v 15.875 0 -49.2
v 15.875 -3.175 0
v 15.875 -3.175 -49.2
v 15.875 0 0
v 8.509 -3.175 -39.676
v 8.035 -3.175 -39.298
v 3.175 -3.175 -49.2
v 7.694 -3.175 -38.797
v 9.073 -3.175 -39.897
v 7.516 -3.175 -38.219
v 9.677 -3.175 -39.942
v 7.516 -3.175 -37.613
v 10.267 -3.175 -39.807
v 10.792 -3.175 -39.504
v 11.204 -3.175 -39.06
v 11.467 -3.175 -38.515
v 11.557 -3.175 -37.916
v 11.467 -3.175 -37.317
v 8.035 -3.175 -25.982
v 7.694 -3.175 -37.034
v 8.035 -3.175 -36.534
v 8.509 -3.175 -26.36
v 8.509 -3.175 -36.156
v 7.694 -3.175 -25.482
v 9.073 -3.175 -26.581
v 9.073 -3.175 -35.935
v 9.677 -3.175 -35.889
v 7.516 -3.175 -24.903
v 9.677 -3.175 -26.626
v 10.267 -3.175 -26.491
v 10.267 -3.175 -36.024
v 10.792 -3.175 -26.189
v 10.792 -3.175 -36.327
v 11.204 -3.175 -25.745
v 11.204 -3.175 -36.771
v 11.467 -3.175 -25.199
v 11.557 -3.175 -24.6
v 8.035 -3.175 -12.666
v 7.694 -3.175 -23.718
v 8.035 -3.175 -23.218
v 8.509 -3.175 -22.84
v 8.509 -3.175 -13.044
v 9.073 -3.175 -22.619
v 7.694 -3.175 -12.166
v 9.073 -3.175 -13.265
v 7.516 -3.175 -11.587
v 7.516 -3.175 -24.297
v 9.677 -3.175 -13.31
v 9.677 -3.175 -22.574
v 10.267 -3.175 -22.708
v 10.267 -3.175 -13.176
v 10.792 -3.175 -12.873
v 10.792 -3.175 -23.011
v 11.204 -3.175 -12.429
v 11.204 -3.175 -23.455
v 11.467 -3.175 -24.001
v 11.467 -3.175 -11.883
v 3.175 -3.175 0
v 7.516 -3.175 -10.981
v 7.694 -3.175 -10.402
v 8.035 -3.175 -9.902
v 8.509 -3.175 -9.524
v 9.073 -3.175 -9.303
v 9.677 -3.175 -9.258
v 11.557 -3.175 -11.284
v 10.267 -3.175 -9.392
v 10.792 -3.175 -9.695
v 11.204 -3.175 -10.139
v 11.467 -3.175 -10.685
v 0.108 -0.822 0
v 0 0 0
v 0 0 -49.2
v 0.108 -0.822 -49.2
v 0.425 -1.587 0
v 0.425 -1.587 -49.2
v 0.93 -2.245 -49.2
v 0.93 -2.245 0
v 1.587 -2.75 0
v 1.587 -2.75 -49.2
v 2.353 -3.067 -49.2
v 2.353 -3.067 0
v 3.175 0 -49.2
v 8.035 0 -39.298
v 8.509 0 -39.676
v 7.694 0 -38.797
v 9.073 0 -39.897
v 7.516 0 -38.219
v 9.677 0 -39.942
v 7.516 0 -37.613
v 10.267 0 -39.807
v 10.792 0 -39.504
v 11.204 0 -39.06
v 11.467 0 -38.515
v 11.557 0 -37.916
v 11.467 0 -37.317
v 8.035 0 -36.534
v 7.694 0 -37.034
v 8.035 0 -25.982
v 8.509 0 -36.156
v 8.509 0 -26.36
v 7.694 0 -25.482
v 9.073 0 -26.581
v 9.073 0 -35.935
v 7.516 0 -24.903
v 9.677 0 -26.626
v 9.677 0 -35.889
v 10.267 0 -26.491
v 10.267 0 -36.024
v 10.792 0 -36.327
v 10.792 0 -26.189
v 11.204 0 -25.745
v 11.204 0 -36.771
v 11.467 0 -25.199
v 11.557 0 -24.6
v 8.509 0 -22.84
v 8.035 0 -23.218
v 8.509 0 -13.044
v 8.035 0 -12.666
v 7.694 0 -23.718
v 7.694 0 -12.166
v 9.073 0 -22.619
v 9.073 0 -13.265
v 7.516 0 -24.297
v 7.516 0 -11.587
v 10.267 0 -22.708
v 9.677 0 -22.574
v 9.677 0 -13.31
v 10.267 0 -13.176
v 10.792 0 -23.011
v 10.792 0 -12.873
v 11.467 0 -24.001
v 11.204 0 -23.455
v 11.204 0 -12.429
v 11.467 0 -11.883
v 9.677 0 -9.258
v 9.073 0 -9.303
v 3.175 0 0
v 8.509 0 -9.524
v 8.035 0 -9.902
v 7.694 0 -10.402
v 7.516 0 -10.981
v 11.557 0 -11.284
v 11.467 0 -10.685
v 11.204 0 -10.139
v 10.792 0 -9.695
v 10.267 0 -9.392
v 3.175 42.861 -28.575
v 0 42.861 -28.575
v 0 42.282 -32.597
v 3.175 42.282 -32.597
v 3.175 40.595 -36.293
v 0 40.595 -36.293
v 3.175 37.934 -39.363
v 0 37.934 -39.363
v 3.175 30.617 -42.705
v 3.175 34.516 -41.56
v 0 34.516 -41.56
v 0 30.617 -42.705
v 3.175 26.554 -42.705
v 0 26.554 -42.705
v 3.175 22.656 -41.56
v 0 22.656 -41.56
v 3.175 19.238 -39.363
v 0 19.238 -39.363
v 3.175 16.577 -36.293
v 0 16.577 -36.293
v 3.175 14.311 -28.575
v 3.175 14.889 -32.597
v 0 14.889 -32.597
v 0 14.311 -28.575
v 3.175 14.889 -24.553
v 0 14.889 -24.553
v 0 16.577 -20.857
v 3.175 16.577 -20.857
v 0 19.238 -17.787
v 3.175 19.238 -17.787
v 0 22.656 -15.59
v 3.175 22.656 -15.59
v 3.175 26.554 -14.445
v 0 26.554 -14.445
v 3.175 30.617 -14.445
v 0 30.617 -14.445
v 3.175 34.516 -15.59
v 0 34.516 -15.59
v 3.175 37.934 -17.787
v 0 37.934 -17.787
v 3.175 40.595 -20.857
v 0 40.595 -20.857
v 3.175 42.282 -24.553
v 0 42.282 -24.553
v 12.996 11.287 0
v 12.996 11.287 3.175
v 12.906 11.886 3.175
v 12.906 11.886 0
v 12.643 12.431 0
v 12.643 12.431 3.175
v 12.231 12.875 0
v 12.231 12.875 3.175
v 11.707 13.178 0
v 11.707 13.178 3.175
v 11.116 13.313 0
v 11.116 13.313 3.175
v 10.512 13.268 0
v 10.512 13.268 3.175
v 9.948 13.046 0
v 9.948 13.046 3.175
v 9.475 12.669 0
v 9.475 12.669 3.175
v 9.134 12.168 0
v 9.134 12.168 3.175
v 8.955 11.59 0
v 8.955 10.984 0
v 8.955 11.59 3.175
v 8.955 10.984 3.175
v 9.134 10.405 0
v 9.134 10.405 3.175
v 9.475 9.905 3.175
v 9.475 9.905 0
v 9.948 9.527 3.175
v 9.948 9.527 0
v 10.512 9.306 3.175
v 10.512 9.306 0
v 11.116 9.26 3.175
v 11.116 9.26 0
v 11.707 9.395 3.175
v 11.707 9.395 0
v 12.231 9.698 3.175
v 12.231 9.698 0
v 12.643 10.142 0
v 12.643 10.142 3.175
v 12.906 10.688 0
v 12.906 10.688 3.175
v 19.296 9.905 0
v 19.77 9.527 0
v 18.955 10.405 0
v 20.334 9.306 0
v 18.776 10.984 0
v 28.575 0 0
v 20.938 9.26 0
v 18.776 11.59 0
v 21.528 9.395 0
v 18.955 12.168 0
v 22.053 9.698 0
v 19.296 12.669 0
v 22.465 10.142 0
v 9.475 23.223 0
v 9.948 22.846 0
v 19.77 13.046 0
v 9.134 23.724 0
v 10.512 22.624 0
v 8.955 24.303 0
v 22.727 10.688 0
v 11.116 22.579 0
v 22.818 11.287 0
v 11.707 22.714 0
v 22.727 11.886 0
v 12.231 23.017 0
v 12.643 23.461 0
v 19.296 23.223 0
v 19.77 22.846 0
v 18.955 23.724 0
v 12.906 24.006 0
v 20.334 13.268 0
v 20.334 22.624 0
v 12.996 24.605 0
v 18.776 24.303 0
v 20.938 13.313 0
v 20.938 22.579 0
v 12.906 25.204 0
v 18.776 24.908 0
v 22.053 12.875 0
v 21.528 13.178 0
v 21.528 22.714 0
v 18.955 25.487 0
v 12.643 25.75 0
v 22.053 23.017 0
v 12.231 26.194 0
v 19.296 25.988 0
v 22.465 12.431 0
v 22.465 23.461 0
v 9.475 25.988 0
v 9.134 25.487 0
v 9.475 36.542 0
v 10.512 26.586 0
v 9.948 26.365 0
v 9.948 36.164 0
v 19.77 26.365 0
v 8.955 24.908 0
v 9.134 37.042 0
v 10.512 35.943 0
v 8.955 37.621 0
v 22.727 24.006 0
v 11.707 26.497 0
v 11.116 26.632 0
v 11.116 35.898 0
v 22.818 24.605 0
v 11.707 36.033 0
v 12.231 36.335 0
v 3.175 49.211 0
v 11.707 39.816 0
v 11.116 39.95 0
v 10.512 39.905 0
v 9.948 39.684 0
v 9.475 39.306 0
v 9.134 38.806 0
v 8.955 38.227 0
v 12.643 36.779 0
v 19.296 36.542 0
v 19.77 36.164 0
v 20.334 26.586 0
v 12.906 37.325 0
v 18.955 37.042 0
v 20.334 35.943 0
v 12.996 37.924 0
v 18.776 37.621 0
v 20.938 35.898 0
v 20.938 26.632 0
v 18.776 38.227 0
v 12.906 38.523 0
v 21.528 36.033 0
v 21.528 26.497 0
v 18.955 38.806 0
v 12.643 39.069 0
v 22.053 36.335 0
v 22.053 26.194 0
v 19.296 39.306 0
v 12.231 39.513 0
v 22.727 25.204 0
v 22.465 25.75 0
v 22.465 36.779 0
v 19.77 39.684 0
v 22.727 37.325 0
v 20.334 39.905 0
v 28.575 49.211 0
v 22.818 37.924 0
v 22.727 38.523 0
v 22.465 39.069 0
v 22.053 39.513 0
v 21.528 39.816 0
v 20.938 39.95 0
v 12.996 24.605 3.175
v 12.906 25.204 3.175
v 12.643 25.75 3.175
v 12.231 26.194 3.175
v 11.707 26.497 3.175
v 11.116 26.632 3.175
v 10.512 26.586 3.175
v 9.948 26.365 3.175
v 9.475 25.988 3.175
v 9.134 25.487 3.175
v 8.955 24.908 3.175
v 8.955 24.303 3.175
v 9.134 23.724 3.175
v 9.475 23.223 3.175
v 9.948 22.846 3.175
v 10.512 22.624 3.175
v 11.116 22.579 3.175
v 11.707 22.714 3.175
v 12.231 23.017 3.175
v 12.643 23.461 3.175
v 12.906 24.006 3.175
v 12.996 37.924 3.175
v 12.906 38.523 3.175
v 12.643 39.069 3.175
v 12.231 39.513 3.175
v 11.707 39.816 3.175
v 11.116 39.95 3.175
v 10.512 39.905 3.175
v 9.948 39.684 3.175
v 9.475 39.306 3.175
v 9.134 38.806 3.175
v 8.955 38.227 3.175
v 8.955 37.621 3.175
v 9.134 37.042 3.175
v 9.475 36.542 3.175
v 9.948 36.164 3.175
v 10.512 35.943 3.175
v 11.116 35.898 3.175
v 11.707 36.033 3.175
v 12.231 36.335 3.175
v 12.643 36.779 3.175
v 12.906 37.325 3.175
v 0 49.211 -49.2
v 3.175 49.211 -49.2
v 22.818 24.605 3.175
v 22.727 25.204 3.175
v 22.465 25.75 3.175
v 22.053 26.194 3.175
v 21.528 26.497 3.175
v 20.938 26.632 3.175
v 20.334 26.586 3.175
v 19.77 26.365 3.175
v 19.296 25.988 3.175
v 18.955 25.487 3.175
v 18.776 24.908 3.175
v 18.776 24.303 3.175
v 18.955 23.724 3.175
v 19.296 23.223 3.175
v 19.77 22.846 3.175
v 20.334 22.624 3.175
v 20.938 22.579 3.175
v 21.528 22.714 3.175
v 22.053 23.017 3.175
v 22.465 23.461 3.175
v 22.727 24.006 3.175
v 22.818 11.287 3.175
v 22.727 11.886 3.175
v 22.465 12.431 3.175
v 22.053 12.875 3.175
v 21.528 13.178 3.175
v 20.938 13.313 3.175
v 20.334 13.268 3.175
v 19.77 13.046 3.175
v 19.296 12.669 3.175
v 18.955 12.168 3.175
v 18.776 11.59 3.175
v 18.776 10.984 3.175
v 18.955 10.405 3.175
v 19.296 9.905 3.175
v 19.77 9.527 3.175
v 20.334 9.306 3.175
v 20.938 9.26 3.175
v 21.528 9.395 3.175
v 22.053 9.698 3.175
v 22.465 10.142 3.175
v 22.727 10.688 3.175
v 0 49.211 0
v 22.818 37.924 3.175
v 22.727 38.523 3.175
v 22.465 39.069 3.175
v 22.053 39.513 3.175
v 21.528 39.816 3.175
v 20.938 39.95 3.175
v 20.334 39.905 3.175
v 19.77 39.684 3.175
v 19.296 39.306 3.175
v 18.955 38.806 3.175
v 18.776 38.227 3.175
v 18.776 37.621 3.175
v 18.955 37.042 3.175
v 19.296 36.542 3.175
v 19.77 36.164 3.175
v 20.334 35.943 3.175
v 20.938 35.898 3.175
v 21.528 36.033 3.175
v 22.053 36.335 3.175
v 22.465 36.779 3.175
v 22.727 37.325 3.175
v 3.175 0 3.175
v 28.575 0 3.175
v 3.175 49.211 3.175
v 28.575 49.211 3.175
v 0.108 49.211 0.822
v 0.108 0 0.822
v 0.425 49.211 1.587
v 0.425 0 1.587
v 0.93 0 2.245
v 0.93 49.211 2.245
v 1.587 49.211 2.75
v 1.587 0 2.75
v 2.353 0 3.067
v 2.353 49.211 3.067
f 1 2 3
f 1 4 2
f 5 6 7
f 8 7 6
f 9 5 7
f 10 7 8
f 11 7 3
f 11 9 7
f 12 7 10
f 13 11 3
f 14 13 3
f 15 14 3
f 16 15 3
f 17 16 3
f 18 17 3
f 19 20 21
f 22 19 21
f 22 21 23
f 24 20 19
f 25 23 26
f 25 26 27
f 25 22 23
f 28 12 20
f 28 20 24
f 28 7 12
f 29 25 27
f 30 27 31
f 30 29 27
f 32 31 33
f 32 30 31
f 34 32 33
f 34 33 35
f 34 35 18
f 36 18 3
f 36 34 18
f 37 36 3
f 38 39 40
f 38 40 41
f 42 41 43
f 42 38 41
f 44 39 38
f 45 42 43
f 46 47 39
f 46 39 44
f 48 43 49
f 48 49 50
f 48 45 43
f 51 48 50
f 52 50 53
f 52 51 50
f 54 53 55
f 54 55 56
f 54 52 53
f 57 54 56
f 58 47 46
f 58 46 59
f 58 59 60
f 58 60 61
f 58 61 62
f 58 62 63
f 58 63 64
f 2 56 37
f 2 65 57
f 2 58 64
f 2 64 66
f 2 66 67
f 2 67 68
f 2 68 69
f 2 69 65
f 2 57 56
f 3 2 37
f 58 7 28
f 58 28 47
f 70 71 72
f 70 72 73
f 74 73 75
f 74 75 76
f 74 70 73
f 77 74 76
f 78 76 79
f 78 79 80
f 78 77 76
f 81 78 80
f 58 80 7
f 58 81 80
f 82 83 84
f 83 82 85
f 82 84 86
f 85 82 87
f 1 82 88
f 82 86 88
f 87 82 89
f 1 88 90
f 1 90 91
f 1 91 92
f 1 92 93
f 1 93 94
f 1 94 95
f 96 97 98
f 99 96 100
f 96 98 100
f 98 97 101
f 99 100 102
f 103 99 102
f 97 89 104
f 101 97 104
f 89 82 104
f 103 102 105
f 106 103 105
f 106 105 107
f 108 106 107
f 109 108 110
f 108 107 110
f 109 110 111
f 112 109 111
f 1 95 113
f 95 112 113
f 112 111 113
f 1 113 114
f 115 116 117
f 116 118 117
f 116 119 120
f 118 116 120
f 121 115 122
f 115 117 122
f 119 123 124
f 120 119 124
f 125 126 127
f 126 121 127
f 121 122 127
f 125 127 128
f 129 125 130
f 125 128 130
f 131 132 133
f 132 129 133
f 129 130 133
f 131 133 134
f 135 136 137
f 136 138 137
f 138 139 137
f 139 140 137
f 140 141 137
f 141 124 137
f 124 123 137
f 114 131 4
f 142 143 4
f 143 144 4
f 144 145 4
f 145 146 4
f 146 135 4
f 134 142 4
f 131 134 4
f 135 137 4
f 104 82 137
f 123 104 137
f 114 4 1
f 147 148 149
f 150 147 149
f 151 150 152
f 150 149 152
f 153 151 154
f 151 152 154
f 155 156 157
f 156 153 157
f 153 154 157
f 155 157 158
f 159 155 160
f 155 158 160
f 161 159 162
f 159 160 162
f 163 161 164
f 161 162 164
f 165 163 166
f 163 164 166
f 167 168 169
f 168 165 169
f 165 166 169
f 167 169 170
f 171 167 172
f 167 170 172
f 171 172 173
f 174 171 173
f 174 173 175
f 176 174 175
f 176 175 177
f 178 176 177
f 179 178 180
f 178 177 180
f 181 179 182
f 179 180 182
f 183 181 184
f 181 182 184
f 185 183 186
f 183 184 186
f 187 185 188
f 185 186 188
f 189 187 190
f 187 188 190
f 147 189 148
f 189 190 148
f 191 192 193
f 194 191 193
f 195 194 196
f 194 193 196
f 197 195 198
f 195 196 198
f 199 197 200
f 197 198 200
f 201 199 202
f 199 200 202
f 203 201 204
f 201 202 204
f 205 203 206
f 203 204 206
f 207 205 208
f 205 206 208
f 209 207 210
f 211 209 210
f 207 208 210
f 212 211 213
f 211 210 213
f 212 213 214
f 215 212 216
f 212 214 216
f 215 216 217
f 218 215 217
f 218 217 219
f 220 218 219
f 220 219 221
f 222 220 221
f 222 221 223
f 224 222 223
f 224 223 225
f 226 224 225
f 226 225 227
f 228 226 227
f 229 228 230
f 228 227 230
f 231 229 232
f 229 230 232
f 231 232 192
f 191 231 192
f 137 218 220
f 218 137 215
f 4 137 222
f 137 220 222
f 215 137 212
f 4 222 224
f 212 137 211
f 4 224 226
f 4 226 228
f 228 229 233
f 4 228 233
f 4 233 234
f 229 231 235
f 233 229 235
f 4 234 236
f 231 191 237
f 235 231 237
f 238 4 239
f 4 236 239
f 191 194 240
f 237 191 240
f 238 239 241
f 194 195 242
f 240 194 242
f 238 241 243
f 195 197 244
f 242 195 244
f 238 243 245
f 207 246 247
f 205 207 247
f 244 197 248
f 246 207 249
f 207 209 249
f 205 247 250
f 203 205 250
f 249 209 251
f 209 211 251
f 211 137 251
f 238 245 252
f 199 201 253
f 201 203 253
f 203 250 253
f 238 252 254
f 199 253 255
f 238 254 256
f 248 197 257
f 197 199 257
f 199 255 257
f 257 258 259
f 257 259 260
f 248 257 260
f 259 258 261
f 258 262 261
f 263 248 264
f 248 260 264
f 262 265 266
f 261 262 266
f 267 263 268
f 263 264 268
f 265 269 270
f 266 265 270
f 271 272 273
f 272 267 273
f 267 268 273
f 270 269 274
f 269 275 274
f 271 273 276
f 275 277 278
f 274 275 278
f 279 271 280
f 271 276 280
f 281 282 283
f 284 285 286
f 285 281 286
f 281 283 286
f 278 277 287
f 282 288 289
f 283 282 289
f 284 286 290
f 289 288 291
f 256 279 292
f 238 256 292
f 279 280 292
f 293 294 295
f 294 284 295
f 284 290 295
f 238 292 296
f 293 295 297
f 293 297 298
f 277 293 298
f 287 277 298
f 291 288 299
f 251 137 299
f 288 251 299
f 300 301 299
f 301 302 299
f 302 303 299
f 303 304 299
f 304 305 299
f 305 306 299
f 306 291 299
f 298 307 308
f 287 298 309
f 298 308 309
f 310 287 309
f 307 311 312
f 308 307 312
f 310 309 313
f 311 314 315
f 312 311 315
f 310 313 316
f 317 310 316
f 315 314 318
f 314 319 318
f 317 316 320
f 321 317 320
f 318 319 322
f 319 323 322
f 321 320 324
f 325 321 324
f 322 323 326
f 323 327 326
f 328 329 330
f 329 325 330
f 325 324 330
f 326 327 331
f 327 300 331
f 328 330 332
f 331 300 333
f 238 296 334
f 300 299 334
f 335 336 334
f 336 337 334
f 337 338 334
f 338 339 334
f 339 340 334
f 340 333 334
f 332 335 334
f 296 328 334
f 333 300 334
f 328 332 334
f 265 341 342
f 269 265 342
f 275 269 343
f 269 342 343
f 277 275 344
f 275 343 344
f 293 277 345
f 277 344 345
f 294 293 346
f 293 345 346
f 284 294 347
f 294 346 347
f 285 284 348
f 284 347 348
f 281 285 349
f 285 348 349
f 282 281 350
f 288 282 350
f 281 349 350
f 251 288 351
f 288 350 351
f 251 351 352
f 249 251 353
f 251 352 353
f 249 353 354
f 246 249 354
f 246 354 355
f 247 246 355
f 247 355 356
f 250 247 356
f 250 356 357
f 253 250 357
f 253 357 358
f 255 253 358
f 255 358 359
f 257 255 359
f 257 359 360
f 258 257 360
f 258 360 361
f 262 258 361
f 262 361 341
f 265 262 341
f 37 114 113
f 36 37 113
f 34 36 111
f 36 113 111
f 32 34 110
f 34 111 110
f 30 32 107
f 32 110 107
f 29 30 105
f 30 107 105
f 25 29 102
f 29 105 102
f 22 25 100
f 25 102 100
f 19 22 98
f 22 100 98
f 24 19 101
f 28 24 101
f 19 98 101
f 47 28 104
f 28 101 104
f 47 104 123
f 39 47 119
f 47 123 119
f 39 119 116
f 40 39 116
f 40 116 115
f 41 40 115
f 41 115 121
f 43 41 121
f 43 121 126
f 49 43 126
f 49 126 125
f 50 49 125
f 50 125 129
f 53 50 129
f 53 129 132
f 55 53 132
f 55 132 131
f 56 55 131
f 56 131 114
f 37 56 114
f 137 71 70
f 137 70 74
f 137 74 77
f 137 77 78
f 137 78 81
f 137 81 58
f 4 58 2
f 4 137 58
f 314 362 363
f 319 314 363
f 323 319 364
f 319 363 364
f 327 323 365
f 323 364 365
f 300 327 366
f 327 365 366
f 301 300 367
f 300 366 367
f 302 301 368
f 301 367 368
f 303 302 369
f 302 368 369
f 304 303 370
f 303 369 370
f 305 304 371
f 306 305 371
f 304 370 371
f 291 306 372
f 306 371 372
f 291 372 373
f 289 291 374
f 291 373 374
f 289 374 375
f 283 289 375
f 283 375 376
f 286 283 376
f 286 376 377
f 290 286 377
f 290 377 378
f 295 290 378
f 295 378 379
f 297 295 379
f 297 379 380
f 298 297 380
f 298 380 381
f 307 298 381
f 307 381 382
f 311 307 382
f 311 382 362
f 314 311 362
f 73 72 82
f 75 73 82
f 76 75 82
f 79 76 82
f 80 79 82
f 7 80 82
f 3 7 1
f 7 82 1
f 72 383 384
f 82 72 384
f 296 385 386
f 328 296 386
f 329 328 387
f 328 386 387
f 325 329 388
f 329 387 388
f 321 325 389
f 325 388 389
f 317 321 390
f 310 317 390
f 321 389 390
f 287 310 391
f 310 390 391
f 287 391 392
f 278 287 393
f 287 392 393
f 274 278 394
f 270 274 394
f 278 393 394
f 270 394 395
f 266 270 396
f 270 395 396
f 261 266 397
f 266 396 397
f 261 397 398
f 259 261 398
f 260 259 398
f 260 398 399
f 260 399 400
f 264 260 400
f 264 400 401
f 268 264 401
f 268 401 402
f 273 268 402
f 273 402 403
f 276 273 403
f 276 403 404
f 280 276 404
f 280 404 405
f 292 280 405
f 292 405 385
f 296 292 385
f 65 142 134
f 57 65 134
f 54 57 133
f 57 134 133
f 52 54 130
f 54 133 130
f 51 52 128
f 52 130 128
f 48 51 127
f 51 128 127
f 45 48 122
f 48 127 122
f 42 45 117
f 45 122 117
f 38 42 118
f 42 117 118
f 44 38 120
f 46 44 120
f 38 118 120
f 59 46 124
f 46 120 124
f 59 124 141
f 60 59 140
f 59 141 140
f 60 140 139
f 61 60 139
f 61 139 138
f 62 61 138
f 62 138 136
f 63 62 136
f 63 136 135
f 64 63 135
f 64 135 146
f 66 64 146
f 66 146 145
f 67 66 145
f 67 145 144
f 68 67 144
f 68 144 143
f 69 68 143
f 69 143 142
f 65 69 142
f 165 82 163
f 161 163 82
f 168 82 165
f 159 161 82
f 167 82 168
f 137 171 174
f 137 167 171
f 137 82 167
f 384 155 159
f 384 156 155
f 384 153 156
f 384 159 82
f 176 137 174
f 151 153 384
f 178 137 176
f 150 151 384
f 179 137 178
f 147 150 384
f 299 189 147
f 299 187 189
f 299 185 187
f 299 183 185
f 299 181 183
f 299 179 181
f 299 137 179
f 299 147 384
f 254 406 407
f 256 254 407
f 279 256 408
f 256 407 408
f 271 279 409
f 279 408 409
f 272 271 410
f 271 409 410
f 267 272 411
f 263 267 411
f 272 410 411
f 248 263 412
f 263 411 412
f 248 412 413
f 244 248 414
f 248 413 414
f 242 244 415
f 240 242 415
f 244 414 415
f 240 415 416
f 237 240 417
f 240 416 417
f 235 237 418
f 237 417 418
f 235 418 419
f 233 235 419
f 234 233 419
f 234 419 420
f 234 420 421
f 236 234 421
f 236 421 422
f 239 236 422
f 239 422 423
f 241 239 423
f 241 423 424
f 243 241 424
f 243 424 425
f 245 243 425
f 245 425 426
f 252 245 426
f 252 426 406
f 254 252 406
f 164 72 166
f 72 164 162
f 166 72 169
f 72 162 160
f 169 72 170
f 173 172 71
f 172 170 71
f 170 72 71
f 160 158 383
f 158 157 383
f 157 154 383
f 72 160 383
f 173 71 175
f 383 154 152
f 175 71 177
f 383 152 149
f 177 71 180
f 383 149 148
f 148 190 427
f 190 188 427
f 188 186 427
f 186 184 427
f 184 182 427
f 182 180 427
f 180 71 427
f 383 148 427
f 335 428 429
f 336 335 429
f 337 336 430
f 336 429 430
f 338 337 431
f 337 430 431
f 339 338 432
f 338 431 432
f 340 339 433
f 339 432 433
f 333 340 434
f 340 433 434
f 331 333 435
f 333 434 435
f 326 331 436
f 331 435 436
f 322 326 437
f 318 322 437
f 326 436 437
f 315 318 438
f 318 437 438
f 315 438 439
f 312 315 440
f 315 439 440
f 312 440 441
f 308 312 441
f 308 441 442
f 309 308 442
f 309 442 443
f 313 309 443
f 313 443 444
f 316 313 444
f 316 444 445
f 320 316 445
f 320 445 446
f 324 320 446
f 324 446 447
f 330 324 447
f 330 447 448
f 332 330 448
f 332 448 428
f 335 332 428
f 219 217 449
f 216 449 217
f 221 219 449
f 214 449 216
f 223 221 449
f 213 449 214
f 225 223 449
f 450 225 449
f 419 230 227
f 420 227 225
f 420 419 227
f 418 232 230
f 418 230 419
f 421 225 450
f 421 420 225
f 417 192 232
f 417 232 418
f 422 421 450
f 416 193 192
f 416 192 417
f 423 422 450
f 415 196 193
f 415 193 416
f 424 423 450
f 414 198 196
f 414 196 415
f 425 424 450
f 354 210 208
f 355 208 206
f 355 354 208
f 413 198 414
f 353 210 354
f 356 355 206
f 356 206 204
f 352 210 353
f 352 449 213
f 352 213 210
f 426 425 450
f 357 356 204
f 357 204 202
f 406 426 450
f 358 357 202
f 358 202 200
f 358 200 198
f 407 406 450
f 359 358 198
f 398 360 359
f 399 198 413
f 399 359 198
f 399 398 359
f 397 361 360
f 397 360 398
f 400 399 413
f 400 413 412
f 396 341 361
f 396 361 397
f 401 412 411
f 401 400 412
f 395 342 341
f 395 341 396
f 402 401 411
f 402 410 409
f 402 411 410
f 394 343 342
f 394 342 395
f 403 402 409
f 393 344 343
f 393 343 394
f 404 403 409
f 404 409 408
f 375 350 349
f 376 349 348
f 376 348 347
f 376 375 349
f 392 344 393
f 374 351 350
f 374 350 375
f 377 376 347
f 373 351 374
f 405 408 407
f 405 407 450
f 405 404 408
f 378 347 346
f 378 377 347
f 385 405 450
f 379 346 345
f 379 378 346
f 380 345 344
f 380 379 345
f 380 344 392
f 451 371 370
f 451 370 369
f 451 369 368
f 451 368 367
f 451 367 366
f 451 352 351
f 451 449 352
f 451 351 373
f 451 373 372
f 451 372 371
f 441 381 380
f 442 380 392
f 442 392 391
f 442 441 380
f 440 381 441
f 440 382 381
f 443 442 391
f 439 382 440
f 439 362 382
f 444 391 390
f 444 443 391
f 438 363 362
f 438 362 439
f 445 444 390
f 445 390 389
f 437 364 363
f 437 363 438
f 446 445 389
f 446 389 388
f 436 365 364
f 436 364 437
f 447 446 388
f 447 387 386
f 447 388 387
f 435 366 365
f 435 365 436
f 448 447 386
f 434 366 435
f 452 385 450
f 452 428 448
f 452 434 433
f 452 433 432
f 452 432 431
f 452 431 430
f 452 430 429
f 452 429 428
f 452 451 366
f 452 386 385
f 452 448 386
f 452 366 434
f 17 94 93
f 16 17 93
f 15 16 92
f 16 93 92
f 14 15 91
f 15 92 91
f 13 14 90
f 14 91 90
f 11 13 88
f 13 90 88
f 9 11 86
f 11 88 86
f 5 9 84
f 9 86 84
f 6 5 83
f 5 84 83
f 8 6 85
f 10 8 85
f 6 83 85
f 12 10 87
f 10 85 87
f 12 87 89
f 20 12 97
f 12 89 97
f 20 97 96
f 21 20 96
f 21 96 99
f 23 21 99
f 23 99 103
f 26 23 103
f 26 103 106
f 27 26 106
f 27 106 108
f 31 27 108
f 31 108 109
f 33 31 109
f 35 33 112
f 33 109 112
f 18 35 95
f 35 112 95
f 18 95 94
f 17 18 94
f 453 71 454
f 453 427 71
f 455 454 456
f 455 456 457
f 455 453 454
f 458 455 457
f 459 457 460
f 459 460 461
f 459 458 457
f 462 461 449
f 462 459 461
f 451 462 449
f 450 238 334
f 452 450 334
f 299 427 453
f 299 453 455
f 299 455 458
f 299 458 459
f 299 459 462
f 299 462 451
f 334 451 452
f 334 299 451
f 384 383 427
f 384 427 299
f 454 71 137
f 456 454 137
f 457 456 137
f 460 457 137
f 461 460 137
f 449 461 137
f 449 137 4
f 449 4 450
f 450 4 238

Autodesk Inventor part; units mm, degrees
ref_plane "YZ Plane" through (0, 0, 0) normal (1, 0, 0) x (0, 1, 0)
ref_plane "XZ Plane" through (0, 0, 0) normal (0, 1, 0) x (-1, 0, 0)
ref_plane "XY Plane" through (0, 0, 0) normal (0, 0, 1) x (1, 0, 0)
sketch "Sketch1" plane through (0, 0, 0) normal (1, 0, 0) x (0, 1, 0)
  line L0 (0, 0) -> (49.2107, 0)
  line L1 (49.2107, 0) -> (49.2107, -49.1998)
  line L2 (49.2107, -49.1998) -> (0, -49.1998)
  line L3 (0, -49.1998) -> (0, 0)
  circle A0 centre (28.5859, -28.575) radius 14.2748
  point P0 (42.8607, -28.575)
  point P1 (28.5859, -42.8498)
  dimension "d0" = 28.5859
  dimension "d1" = 28.5496
  dimension "d2" = 6.35
  dimension "d3" = 6.35
  dimension "d4" = 28.575
extrude "Extrusion1" add sketch "Sketch1" along normal blind 3.175
sketch "Sketch2" plane through (0, 0, -49.1998) normal (0, -1, 0) x (1, 0, 0)
  line L0 (3.175, 49.1998) -> (3.175, 0) projected
  line L1 (3.175, 49.1998) -> (15.875, 49.1998)
  line L2 (15.875, 49.1998) -> (15.875, 0)
  line L3 (15.875, 0) -> (3.175, 0)
  line L4 (3.175, 0) -> (3.175, 49.1998)
  point P0 (0, 49.1998)
  dimension "d7" = 12.7
extrude "Extrusion2" add sketch "Sketch2" along normal blind 3.175
sketch "Sketch3" plane through (0, 0, 0) normal (0, 0, 1) x (1, 0, 0)
  line L0 (3.175, 0) -> (3.175, 49.2107) projected
  line L1 (3.175, 0) -> (28.575, 0)
  line L2 (28.575, 0) -> (28.575, 49.2107)
  line L3 (28.575, 49.2107) -> (3.175, 49.2107)
  line L4 (3.175, 49.2107) -> (3.175, 0)
  point P0 (0, 0)
  dimension "d10" = 25.4
extrude "Extrusion3" add sketch "Sketch3" along normal blind 3.175
sketch "Sketch4" plane through (3.175, -3.175, 0) normal (0, 0, 1) x (1, 0, 0)
  line L0 (-3.175, 3.175) -> (0, 3.175) projected
  line L1 (0, 3.175) -> (0, 0) projected
  arc A0 (-3.175, 3.175) -> (0, 0) centre (0, 3.175) ccw
extrude "Extrusion4" add sketch "Sketch4" against normal up to surface (49.1998 mm away)
sketch "Sketch5" plane through (0, 49.2107, 0) normal (0, 1, 0) x (1, 0, 0)
  line L0 (3.175, 0) -> (3.175, -3.175) projected
  line L1 (0, 0) -> (3.175, 0) projected
  arc A0 (0, 0) -> (3.175, -3.175) centre (3.175, 0) ccw
extrude "Extrusion5" add sketch "Sketch5" against normal up to surface (49.2107 mm away)
sketch "Sketch6" plane through (0, 0, 3.175) normal (0, 0, 1) x (1, 0, 0)
  line L0 (3.175, 0) -> (28.575, 0) projected
  line L1 (28.575, 0) -> (28.575, 49.2107) projected
  line L2 (28.575, 49.2107) -> (3.175, 49.2107) projected
  line L3 (3.175, 49.2107) -> (3.175, 0) projected
  circle A0 centre (10.9643, 37.9241) radius 2.032
  circle A1 centre (20.7857, 37.9241) radius 2.032
  line L4 (12.9963, 37.9241) -> (18.7537, 37.9241)
  line L5 (8.9323, 37.9241) -> (3.175, 37.9241)
  line L6 (22.8177, 37.9241) -> (28.575, 37.9241)
  circle A2 centre (10.9643, 24.6054) radius 2.032
  circle A3 centre (10.9643, 11.2867) radius 2.032
  line L7 (10.9643, 39.9561) -> (10.9643, 49.2107)
  line L8 (28.575, 49.2107) -> (3.175, 49.2107) projected
  line L9 (10.9643, 26.6374) -> (10.9643, 35.8921)
  line L10 (10.9643, 13.3187) -> (10.9643, 22.5734)
  line L11 (10.9643, 9.2547) -> (10.9643, 0)
  circle A4 centre (20.7857, 24.6054) radius 2.032
  circle A5 centre (20.7857, 11.2867) radius 2.032
  point P0 (0, 0)
  dimension "d17" = 4.064
  dimension "d20" = 4.064
  dimension "d23" = 4.064
  dimension "d24" = 4.064
  dimension "d25" = 4.064
  dimension "d26" = 4.064
extrude "Extrusion6" cut sketch "Sketch6" against normal blind 3.175 contours A3 | A0 | A1 | A2 | A4 | A5
sketch "Sketch7" plane through (0, 0, -49.1998) normal (0, 1, 0) x (1, 0, 0)
  line L0 (3.175, -49.1998) -> (15.875, -49.1998) projected
  line L1 (15.875, -49.1998) -> (15.875, 0) construction
  line L2 (15.875, 0) -> (3.175, 0) projected
  line L3 (3.175, -49.1998) -> (3.175, 0) projected
  circle A0 centre (9.525, -11.284) radius 2.032
  circle A1 centre (9.525, -24.5999) radius 2.032
  circle A2 centre (9.525, -37.9158) radius 2.032
  line L4 (9.525, -9.2519) -> (9.525, 0)
  line L5 (9.525, -13.3159) -> (9.525, -22.5679) construction
  line L6 (9.525, -26.6319) -> (9.525, -35.8838)
  line L7 (9.525, -39.9478) -> (9.525, -49.1998)
  line L8 (28.575, -49.1998) -> (3.175, -49.1998) projected
  point P0 (0, -49.1998)
  dimension "d29" = 4.064
  dimension "d30" = 4.064
  dimension "d31" = 4.064
extrude "Extrusion7" cut sketch "Sketch7" against normal blind 3.175
properties part number "Robot to Bottomish Plate to Pivot Hex Axle"
